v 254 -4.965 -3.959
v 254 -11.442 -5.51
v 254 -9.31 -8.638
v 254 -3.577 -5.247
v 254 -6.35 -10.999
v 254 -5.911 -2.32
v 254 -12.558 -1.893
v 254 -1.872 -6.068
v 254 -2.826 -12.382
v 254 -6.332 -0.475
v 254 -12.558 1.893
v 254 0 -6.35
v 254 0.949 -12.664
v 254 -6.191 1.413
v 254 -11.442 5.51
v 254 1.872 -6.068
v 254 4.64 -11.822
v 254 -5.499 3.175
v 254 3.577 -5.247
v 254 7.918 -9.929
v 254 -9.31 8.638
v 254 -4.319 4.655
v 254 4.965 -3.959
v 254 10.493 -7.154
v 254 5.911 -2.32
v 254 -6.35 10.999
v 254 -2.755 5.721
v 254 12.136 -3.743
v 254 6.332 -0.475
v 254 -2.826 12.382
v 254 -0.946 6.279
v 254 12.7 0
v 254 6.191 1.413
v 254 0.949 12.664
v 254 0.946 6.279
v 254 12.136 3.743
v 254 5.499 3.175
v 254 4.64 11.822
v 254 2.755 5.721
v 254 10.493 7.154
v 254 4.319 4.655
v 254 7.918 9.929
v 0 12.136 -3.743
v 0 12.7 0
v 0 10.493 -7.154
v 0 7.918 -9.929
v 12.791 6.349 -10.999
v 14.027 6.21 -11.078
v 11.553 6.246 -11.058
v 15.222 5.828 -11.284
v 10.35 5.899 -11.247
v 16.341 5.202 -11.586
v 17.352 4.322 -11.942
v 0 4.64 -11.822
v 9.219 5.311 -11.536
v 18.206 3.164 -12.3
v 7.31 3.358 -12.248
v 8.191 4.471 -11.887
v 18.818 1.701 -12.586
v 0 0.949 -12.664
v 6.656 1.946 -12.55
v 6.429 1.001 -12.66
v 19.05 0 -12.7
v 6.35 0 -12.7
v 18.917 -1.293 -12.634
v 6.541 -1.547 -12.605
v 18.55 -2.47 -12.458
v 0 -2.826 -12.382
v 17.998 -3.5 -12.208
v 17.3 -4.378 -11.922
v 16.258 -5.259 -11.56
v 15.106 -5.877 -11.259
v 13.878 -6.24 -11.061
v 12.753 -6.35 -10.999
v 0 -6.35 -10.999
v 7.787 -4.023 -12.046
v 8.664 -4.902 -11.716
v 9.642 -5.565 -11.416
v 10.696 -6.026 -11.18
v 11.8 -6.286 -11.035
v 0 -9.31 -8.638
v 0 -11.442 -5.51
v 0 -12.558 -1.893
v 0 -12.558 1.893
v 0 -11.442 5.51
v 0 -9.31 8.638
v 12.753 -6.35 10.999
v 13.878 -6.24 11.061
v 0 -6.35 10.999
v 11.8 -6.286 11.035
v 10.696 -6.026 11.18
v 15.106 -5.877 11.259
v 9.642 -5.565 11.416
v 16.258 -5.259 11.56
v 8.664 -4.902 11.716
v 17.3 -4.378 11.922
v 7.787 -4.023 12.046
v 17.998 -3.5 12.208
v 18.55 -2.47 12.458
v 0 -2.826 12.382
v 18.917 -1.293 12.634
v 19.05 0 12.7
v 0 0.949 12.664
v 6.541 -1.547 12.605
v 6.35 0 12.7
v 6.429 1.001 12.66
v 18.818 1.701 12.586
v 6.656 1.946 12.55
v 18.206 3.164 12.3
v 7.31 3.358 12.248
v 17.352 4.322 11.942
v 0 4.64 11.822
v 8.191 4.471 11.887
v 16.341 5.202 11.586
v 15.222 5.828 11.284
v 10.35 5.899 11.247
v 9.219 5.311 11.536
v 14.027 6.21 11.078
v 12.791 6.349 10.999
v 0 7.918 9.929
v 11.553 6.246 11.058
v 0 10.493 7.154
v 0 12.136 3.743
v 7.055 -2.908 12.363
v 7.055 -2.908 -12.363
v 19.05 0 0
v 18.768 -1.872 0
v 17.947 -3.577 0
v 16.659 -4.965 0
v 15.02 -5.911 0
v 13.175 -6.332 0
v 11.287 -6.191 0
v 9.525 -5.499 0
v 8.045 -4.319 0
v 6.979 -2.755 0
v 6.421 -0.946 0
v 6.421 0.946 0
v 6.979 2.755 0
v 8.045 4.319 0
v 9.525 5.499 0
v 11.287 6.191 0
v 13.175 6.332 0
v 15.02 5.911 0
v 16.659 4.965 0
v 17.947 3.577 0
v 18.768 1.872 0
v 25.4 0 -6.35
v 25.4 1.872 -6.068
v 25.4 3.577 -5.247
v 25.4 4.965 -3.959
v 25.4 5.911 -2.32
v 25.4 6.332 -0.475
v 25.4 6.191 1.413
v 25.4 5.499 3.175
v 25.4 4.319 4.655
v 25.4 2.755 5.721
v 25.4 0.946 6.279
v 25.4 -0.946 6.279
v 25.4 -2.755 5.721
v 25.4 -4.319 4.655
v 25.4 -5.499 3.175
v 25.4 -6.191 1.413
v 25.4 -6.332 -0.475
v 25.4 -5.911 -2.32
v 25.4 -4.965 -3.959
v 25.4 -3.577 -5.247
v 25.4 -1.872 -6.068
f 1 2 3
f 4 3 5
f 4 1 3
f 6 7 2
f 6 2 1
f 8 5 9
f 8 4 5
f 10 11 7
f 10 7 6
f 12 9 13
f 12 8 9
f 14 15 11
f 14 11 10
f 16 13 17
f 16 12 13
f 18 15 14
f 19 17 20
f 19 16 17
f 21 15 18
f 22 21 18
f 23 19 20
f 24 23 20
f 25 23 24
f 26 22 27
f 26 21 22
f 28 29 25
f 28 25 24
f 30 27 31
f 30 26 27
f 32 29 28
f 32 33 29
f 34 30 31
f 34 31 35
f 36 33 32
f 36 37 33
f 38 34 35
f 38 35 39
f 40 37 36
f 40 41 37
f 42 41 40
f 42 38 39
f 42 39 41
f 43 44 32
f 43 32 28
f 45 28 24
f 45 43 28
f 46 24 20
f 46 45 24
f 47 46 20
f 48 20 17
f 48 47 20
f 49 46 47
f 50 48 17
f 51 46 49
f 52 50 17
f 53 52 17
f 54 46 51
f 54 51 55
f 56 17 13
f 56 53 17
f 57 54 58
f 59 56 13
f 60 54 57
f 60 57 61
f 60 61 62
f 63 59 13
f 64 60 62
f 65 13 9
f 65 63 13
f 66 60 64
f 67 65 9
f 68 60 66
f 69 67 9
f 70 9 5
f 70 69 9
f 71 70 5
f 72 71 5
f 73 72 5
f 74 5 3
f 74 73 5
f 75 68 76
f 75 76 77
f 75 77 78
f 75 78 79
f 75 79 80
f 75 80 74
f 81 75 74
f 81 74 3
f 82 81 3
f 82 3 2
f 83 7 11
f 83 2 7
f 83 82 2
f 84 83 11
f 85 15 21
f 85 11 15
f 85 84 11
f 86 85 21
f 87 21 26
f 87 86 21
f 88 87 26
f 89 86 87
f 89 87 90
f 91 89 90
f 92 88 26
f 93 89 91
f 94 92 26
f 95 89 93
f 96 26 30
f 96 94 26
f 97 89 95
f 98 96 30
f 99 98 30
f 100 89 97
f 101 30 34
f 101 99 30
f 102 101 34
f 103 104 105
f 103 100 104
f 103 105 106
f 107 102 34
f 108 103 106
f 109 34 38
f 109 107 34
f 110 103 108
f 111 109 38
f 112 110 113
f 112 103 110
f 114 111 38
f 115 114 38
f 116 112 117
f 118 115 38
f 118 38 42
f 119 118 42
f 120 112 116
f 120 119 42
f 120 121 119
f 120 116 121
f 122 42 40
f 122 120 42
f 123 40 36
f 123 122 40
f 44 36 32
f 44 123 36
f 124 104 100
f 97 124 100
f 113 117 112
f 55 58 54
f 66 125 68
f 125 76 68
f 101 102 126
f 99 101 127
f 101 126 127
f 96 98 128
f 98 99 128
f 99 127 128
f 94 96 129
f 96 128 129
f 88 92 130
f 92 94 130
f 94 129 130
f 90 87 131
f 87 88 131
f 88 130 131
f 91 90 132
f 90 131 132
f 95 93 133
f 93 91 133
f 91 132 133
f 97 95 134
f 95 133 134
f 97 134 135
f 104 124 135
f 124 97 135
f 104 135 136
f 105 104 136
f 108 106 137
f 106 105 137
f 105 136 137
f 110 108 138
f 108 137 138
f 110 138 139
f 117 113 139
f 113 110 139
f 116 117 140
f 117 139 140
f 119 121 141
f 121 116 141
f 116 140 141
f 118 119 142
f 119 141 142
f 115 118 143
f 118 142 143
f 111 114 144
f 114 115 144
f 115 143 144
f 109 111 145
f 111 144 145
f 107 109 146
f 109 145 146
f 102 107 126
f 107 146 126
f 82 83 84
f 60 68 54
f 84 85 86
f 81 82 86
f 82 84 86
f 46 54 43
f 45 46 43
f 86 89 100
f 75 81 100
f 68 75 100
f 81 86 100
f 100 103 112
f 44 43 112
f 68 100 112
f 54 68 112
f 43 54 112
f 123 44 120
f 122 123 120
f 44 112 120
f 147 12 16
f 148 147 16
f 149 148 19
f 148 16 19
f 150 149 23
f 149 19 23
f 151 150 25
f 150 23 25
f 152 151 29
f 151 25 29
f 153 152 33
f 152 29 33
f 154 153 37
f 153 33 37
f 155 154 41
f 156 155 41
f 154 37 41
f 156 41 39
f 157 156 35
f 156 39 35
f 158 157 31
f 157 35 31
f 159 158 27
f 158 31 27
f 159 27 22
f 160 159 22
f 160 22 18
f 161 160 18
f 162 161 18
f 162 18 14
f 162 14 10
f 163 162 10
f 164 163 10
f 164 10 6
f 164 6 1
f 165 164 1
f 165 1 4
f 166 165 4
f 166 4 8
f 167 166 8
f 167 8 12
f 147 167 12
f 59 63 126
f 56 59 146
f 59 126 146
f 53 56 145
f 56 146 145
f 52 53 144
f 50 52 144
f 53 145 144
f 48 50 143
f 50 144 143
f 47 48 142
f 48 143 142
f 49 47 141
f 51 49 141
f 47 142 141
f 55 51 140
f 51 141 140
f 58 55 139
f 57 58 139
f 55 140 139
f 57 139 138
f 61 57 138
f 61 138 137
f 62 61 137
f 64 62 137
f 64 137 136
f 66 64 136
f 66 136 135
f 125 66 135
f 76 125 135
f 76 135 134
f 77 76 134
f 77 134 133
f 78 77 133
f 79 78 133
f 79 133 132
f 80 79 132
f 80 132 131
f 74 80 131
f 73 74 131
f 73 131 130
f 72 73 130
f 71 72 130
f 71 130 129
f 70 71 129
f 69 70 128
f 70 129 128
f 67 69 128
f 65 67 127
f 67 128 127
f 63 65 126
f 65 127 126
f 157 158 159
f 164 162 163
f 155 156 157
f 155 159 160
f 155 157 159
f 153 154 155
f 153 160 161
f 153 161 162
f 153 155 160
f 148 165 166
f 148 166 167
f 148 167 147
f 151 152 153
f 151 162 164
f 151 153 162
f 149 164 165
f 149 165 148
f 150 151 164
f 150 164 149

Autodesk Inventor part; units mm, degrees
ref_plane "YZ Plane" through (0, 0, 0) normal (1, 0, 0) x (0, 1, 0)
ref_plane "XZ Plane" through (0, 0, 0) normal (0, 1, 0) x (-1, 0, 0)
ref_plane "XY Plane" through (0, 0, 0) normal (0, 0, 1) x (1, 0, 0)
sketch "Sketch1" plane through (0, 0, 0) normal (1, 0, 0) x (0, 1, 0)
  circle A0 centre (0, 0) radius 12.7
  dimension "d0" = 25.4
extrude "Extrusion1" add sketch "Sketch1" along normal blind 254
sketch "Sketch2" plane through (0, 0, 0) normal (0, 0, 1) x (1, 0, 0)
  circle A0 centre (12.7, 0) radius 6.35
  line L0 (0, 12.7) -> (0, -12.7) projected
  dimension "d3" = 12.7
  dimension "d4" = 12.7
extrude "Extrusion2" cut sketch "Sketch2" along normal mid plane 25.4
sketch "Sketch3" plane through (254, 0, 0) normal (1, 0, 0) x (0, 0, -1)
  circle A0 centre (0, 0) radius 6.35
  dimension "d7" = 12.7
extrude "Extrusion3" cut sketch "Sketch3" against normal blind 228.6
properties material "Aluminum 6061"
